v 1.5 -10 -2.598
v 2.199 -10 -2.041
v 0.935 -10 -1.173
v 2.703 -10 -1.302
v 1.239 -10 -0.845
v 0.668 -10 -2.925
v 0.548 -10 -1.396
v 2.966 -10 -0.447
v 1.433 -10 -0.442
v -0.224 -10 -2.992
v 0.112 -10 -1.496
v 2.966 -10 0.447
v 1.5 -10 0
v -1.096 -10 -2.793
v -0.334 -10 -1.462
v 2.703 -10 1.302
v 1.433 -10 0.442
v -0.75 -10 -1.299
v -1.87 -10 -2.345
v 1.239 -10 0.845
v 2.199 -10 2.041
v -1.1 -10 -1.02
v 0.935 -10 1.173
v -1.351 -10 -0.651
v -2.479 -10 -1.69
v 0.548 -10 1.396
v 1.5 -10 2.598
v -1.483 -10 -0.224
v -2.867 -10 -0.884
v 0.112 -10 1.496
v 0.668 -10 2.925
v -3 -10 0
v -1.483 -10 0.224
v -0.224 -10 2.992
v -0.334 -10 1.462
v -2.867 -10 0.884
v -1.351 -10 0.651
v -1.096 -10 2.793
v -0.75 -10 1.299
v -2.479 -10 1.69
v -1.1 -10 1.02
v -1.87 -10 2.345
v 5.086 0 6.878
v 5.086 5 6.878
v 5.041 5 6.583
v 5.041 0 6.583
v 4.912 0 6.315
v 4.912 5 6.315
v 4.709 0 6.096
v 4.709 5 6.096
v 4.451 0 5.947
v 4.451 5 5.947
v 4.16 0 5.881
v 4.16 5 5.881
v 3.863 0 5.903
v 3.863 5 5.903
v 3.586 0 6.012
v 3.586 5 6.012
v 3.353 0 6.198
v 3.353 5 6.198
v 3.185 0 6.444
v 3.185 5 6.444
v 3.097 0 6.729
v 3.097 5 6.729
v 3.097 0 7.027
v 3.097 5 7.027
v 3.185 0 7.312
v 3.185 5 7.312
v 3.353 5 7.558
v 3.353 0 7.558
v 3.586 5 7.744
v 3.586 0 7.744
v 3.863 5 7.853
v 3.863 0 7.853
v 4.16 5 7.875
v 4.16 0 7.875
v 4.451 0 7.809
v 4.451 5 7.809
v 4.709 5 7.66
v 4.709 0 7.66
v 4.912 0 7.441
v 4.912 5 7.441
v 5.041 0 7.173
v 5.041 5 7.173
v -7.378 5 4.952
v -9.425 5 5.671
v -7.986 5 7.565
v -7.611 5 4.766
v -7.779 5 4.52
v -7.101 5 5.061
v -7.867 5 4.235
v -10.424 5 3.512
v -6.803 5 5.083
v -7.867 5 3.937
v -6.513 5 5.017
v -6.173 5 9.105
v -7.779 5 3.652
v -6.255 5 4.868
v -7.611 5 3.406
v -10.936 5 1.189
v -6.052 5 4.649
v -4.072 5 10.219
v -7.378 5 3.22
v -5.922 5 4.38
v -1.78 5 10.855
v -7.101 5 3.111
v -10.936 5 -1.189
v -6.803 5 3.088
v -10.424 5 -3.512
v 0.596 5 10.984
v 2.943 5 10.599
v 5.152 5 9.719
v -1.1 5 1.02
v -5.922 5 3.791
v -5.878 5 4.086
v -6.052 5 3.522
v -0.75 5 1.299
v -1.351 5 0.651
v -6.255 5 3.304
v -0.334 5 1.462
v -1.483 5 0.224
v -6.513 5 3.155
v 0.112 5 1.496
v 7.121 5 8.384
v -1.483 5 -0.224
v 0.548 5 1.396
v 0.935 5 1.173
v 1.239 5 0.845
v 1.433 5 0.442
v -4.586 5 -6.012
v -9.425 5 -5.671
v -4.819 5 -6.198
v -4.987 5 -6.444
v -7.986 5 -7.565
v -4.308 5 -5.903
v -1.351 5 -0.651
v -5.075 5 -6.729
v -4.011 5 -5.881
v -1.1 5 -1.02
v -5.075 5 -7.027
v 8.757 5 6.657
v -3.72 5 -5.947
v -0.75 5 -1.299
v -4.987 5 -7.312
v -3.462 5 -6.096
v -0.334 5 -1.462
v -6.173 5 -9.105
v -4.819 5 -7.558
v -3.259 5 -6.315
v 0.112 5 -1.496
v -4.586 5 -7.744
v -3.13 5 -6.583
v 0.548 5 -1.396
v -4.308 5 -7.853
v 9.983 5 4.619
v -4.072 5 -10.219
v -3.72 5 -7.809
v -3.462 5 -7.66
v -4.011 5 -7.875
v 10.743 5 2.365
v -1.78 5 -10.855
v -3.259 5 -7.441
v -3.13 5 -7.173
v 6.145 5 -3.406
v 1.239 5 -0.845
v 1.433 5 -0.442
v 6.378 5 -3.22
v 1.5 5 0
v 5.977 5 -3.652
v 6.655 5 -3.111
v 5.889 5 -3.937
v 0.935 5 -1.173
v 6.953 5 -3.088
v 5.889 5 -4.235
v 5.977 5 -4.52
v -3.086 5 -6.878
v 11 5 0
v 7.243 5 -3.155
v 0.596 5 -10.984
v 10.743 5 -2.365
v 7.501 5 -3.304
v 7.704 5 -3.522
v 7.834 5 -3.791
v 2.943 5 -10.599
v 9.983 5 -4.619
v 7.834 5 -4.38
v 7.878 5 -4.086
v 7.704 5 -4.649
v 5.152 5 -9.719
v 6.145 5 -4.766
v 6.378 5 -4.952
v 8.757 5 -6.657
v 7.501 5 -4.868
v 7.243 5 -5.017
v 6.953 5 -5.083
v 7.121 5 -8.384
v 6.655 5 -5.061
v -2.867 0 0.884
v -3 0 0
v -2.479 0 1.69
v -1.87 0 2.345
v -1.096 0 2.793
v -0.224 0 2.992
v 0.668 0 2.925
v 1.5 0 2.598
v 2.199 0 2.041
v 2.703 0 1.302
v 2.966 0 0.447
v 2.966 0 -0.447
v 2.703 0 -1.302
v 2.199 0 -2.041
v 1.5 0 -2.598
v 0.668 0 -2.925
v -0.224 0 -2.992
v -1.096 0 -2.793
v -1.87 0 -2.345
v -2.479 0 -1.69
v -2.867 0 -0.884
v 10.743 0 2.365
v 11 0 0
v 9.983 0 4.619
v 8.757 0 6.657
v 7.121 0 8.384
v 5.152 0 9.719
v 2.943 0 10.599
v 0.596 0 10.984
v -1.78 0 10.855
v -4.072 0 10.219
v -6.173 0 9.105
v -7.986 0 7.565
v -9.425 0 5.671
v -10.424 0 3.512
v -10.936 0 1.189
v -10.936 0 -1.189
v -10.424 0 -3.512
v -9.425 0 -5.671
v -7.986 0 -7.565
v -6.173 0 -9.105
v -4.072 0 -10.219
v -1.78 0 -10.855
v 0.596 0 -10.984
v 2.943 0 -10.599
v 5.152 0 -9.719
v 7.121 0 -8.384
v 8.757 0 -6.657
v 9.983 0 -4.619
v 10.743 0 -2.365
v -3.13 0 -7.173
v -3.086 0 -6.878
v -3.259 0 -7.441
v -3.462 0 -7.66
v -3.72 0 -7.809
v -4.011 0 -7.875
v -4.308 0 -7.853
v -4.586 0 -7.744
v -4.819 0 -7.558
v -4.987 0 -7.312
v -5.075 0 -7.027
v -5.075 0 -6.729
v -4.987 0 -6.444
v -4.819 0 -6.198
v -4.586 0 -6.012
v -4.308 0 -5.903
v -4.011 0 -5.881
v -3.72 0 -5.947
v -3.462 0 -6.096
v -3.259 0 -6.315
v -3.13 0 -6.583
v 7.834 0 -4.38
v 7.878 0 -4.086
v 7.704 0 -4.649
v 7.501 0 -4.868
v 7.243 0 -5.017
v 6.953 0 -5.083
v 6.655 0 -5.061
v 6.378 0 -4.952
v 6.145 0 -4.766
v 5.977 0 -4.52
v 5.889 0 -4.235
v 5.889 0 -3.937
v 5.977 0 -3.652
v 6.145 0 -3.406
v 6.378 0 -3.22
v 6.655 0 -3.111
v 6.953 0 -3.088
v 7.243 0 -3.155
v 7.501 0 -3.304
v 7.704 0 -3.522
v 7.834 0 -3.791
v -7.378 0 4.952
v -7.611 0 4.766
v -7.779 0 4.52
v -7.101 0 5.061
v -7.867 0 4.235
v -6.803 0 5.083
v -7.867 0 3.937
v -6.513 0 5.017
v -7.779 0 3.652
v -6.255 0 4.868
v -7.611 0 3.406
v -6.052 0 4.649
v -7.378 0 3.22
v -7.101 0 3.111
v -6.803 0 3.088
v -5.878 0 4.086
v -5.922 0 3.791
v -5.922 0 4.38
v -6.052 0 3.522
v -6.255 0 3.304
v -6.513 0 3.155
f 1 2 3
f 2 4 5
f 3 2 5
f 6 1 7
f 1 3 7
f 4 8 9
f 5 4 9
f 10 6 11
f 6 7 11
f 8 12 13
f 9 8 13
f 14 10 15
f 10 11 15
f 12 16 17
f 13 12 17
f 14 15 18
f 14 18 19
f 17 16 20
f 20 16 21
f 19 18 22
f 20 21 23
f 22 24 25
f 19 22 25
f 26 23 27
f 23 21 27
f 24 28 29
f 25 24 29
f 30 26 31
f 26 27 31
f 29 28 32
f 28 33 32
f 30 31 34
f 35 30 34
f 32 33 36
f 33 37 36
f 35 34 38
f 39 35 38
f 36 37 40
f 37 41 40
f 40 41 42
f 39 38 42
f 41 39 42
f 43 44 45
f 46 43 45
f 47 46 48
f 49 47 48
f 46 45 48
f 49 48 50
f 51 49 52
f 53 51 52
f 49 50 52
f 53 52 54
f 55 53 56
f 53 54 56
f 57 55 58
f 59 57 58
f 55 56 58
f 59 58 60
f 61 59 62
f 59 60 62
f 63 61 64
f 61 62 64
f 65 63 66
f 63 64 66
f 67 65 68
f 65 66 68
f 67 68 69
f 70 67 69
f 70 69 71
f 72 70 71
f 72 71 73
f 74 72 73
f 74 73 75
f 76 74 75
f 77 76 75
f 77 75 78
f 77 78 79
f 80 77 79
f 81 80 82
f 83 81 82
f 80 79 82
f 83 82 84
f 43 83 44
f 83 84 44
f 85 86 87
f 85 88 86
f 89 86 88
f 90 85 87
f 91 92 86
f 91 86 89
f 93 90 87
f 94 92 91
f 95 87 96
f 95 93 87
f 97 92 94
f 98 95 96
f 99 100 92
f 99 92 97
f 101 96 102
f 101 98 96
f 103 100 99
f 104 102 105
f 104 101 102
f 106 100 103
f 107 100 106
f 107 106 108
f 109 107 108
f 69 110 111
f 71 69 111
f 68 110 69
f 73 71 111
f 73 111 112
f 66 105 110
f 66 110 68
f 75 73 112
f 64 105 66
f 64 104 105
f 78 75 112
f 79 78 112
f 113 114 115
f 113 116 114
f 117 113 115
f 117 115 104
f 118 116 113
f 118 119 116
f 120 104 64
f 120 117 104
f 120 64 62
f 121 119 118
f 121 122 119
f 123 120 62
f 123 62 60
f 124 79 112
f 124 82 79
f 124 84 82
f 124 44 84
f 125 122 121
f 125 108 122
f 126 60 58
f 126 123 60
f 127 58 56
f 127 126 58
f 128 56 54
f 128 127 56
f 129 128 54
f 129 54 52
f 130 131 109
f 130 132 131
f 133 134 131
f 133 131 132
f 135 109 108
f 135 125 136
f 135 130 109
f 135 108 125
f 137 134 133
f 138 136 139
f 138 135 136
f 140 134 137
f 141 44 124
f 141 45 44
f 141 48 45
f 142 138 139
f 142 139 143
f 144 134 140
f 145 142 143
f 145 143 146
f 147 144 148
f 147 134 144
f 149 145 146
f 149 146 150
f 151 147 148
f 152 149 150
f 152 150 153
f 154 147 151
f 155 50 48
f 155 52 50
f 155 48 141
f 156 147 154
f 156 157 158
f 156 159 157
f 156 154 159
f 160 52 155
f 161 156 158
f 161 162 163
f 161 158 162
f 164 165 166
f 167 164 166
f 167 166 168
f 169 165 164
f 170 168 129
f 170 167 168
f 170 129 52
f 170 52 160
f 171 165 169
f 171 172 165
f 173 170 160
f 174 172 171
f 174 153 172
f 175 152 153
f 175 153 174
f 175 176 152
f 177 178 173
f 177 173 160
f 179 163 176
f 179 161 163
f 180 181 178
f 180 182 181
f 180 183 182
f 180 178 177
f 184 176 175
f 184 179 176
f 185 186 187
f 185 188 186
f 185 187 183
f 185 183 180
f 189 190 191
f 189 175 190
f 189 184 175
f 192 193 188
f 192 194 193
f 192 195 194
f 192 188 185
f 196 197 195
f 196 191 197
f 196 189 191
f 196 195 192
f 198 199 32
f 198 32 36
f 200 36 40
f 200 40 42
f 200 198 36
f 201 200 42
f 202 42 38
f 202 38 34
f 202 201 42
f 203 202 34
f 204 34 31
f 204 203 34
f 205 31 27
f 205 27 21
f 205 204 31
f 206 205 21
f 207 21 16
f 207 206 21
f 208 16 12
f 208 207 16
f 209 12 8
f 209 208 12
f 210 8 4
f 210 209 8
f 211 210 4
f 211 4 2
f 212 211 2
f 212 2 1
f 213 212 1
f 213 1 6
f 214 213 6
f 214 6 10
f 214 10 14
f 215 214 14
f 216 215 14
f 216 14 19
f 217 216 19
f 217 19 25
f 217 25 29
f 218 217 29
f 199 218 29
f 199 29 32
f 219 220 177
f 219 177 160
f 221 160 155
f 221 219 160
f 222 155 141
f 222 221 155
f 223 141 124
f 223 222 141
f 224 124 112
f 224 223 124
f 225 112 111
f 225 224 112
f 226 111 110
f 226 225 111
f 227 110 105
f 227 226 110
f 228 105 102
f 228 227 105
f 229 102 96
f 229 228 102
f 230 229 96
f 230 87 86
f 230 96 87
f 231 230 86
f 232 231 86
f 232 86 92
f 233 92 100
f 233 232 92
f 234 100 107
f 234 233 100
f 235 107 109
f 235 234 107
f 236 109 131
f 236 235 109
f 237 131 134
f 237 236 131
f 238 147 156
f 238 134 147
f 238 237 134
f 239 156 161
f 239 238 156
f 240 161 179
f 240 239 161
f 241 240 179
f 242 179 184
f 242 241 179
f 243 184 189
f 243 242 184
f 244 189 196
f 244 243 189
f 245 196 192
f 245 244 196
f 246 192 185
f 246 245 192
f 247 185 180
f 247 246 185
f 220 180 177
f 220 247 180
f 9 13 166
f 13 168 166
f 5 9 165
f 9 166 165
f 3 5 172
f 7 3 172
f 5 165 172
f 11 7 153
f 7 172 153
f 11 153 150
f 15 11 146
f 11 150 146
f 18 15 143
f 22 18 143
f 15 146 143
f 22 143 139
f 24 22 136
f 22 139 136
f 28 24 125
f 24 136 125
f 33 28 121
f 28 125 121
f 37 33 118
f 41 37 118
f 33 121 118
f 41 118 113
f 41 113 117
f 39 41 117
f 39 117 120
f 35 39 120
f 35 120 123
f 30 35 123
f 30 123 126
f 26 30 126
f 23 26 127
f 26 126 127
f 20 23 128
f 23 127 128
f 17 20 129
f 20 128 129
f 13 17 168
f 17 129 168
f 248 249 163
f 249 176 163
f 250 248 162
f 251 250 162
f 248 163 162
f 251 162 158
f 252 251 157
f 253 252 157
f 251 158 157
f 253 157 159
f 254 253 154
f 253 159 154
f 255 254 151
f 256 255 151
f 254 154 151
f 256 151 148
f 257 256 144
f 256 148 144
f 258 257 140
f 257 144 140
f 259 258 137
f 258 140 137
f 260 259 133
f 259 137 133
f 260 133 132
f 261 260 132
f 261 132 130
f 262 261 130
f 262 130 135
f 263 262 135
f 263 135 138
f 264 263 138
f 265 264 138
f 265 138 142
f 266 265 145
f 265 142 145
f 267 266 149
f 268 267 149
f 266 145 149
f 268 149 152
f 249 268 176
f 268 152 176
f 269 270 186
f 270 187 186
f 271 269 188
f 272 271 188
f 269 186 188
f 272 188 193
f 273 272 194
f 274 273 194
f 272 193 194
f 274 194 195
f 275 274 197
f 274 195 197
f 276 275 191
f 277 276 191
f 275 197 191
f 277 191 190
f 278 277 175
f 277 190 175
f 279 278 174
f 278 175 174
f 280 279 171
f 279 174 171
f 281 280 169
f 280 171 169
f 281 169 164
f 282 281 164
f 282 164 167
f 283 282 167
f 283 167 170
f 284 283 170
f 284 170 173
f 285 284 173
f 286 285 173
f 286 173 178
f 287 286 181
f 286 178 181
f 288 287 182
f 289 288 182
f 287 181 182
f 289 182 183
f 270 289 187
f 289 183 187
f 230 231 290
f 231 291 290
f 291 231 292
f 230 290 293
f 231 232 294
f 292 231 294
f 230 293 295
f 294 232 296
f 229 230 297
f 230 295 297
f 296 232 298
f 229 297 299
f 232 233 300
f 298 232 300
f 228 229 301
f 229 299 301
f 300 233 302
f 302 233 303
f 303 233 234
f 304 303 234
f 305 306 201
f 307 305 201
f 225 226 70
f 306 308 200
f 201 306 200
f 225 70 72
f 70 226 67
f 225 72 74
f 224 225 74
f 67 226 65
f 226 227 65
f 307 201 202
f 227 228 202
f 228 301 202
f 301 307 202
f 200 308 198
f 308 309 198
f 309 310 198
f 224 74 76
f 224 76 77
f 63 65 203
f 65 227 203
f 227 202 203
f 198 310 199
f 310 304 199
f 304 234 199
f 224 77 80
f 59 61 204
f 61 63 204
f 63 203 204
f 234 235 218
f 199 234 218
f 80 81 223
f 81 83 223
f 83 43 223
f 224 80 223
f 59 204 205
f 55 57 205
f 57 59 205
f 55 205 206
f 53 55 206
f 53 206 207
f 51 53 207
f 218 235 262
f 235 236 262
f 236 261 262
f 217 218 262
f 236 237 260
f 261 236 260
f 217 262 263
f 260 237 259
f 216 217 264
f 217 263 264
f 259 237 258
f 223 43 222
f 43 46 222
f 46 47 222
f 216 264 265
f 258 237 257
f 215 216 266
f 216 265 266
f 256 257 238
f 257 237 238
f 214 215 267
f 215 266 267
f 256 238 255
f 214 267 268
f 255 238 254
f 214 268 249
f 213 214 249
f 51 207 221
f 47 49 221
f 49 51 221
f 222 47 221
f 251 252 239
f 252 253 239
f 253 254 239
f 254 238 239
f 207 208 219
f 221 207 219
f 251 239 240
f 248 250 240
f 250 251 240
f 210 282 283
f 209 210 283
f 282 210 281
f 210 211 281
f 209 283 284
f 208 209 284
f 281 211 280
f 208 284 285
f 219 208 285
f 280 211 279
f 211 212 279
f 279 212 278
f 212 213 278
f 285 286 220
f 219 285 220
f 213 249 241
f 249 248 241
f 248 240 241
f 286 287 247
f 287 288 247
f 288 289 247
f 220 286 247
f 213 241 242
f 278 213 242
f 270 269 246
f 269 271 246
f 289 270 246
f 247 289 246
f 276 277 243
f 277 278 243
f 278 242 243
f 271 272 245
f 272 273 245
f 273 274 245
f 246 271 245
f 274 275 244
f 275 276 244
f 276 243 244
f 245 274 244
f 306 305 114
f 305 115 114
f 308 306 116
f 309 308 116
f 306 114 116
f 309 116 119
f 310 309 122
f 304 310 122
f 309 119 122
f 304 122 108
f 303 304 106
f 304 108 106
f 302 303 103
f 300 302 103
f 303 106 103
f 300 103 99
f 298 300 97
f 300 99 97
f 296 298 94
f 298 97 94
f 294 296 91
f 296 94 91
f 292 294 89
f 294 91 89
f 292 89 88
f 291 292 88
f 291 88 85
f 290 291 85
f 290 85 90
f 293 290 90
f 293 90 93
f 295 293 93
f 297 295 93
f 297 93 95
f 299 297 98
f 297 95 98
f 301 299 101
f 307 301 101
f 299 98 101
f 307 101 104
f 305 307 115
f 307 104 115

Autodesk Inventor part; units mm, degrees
ref_plane "YZ Plane" through (0, 0, 0) normal (1, 0, 0) x (0, 1, 0)
ref_plane "XZ Plane" through (0, 0, 0) normal (0, 1, 0) x (-1, 0, 0)
ref_plane "XY Plane" through (0, 0, 0) normal (0, 0, 1) x (1, 0, 0)
sketch "Sketch1" plane through (0, 0, 0) normal (0, 1, 0) x (-1, 0, 0)
  circle A0 centre (0, 0) radius 3
  circle A1 centre (0, 0) radius 11
  dimension "d0" = 6
  dimension "d1" = 22
extrude "Extrusion1" add sketch "Sketch1" against normal blind 10 contours A0
sketch "Sketch2" plane through (0, 0, 0) normal (0, 1, 0) x (1, 0, 0)
  circle A0 centre (0, 0) radius 3
  circle A1 centre (0, 0) radius 11
  dimension "d4" = 6
  dimension "d5" = 22
extrude "Extrusion2" add sketch "Sketch2" along normal blind 5 contours A0 | A1
sketch "Sketch3" plane through (0, 5, 0) normal (0, 1, 0) x (1, 0, 0)
  circle A0 centre (0, 0) radius 1.5
  dimension "d8" = 3
extrude "Extrusion3" cut sketch "Sketch3" against normal up to next
sketch "Sketch4" plane through (0, 5, 0) normal (0, 1, 0) x (1, 0, 0)
  circle A0 centre (-6.878, -4.0857) radius 1
  circle A1 centre (4.0857, -6.878) radius 1
  circle A2 centre (6.878, 4.0857) radius 1
  circle A3 centre (-4.0857, 6.878) radius 1
  circle A4 centre (0, 0) radius 1.5 projected
  dimension "d11" = 2
  dimension "d14" = 360
  dimension "d17" = 5.5
  dimension "d18" = 3
extrude "Extrusion4" cut sketch "Sketch4" against normal up to next contours A0 | A1 | A2 | A3
properties part number "axe_ax12" material "ABS Plastic"
